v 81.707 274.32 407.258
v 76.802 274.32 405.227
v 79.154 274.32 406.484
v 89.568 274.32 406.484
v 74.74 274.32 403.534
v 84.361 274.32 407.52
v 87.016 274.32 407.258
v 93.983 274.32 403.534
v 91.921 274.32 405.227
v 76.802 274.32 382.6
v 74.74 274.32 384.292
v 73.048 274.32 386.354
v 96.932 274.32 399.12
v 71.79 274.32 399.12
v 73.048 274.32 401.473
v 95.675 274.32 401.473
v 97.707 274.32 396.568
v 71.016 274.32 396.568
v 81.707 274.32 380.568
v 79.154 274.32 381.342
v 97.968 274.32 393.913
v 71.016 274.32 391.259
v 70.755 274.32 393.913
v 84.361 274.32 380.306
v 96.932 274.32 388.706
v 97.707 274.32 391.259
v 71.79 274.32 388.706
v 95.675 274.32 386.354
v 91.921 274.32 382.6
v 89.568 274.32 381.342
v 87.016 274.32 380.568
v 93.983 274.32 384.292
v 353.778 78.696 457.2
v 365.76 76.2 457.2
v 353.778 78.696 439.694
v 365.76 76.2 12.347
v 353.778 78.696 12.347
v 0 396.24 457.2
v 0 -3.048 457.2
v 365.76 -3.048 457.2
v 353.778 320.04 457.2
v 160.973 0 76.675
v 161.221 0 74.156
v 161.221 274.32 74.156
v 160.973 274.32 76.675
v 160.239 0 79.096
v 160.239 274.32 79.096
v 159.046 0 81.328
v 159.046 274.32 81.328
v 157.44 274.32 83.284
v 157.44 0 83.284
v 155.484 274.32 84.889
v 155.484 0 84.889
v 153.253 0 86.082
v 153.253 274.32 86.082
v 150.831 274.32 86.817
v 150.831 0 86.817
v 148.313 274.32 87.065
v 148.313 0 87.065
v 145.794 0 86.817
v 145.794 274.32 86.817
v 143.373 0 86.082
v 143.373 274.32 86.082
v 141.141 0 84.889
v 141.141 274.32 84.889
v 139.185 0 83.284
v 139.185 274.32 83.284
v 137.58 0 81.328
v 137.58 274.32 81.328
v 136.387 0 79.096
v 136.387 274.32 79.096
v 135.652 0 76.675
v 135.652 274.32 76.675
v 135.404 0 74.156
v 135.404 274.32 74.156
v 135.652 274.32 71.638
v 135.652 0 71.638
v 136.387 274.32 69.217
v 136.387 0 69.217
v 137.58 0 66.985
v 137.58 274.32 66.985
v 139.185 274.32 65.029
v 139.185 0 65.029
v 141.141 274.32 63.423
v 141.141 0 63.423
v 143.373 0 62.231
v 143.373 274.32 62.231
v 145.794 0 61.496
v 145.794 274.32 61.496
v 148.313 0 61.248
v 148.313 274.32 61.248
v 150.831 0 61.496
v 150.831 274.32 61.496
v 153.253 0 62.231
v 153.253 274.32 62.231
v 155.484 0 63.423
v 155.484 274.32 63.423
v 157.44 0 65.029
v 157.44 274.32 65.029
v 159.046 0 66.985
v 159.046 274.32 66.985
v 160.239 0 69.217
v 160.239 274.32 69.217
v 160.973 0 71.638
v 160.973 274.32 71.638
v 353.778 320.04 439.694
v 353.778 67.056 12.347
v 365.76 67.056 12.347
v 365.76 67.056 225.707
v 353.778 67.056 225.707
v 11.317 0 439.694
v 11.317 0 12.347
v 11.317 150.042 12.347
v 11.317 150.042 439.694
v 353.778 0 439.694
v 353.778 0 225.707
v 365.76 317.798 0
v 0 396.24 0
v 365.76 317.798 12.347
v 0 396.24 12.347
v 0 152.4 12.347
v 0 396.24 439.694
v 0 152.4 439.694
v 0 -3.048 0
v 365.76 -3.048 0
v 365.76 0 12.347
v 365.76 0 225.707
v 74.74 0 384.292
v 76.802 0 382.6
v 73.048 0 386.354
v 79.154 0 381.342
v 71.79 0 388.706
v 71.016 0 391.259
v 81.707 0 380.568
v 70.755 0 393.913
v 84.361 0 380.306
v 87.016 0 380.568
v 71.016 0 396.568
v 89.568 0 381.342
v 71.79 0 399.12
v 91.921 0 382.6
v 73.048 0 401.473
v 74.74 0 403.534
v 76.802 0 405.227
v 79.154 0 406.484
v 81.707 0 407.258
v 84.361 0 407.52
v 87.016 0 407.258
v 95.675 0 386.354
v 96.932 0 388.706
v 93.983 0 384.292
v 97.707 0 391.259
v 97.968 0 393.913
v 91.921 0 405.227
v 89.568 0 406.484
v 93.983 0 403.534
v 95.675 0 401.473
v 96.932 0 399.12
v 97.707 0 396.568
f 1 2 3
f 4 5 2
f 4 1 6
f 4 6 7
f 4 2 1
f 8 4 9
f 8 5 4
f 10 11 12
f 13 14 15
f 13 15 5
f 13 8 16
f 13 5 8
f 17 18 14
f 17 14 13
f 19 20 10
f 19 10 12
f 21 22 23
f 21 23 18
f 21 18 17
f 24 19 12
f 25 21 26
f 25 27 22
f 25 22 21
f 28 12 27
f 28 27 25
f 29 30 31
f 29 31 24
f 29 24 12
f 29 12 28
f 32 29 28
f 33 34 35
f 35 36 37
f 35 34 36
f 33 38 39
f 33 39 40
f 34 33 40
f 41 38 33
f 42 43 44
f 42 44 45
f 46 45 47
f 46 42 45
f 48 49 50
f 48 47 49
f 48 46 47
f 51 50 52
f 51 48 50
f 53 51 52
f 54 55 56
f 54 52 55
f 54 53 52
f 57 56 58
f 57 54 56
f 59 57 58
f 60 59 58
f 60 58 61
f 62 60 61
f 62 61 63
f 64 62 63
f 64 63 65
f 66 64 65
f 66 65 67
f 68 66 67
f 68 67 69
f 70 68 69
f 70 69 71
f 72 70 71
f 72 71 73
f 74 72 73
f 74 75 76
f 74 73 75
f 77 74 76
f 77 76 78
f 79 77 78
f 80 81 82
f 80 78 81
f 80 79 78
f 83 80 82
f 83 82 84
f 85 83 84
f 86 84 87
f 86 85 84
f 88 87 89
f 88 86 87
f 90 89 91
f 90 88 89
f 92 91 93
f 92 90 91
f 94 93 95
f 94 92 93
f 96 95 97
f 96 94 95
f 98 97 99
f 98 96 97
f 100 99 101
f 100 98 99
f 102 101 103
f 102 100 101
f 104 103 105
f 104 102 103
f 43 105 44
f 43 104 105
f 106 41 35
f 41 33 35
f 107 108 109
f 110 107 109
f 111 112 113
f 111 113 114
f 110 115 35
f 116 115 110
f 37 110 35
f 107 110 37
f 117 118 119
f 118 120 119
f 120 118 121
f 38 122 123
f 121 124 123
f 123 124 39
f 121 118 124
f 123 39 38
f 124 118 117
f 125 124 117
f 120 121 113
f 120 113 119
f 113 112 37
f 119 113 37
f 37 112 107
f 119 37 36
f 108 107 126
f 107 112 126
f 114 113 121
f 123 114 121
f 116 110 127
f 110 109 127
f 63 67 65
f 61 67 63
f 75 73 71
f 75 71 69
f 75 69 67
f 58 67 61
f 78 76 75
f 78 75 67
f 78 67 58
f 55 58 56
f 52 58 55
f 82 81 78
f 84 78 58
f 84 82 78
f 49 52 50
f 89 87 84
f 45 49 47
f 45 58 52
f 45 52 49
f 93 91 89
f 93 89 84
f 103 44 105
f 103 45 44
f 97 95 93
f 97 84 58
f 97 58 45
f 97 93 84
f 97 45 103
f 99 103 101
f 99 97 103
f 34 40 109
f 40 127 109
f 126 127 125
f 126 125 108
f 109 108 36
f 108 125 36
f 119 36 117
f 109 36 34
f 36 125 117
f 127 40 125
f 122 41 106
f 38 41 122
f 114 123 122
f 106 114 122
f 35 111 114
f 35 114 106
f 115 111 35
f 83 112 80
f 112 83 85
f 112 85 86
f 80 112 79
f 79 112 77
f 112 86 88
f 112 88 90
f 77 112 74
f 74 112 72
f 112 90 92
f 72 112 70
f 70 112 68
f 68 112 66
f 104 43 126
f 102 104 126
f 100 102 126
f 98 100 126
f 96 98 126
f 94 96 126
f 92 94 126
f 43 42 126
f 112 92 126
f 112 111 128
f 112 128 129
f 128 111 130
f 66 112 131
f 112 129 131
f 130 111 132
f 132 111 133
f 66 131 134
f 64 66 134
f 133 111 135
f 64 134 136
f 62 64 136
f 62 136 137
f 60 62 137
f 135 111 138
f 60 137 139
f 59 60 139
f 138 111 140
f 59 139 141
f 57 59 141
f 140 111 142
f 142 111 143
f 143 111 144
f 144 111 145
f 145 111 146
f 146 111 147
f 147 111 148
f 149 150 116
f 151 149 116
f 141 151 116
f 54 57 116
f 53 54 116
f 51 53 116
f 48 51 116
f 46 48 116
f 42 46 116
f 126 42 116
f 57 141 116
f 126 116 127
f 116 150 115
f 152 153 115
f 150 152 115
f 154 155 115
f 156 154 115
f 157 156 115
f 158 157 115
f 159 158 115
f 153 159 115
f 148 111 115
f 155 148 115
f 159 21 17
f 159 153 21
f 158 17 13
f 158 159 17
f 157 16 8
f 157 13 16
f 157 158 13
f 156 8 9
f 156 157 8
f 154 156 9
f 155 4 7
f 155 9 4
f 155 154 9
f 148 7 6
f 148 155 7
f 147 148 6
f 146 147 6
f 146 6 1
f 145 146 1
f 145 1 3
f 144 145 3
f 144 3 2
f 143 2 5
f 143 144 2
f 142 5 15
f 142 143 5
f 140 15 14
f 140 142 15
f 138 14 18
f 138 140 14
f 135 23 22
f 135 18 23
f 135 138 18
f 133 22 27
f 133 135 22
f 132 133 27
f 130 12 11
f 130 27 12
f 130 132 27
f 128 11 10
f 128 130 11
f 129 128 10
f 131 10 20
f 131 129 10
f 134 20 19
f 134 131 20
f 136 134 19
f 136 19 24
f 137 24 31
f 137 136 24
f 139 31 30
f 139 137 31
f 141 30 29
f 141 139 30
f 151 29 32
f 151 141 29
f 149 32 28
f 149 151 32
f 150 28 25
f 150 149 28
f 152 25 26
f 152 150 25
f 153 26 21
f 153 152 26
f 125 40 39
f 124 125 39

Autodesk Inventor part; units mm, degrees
ref_plane "YZ Plane" through (0, 0, 0) normal (1, 0, 0) x (0, 1, 0)
ref_plane "XZ Plane" through (0, 0, 0) normal (0, 1, 0) x (-1, 0, 0)
ref_plane "XY Plane" through (0, 0, 0) normal (0, 0, 1) x (1, 0, 0)
sketch "Sketch1" plane through (0, 0, 0) normal (0, 0, 1) x (1, 0, 0)
  line L0 (0, 0) -> (0, 152.4)
  line L1 (0, 0) -> (365.76, 0)
  line L2 (365.76, 0) -> (365.76, 76.2)
  line L3 (365.76, 76.2) -> (0, 152.4)
  line L4 (3.048, 0) -> (6.929, 0)
  dimension "d0" = 152.4
  dimension "d1" = 365.76
extrude "Extrusion1" add sketch "Sketch1" along normal blind 457.2
sketch "Sketch2" plane through (0, 0, 0) normal (0, -1, 0) x (1, 0, 0)
  line L0 (11.3168, 439.6936) -> (353.778, 439.6936)
  line L1 (353.778, 439.6936) -> (353.778, 12.302)
  line L2 (353.778, 12.302) -> (11.3168, 12.302)
  line L3 (11.3168, 12.302) -> (11.3168, 439.6936)
  point P0 (0, 0)
extrude "Extrusion2" cut sketch "Sketch2" against normal blind 426.72
sketch "Sketch3" plane through (0, 0, 457.2) normal (0, 0, 1) x (1, 0, 0)
  line L0 (0, 0) -> (365.76, 0) projected
  line L1 (0, 0) -> (365.76, 0)
  line L2 (365.76, 0) -> (365.76, -3.048)
  line L3 (365.76, -3.048) -> (0, -3.048)
  line L4 (0, -3.048) -> (0, 0)
  dimension "d6" = 3.048
extrude "Extrusion3" add sketch "Sketch3" against normal blind 457.2
sketch "Sketch4" plane through (365.76, 76.2, 457.2) normal (1, 0, 0) x (0, 0, -1)
  point P0 (457.2, -76.2)
sketch "Sketch5" plane through (365.76, 76.2, 457.2) normal (1, 0, 0) x (0, 0, -1)
  line L0 (0, -79.248) -> (0, 0) projected
  line L1 (457.2, 0) -> (457.2, -79.248) projected
  line L2 (457.2, 0) -> (457.2, 76.2) projected
  line L3 (457.2, 0) -> (441.96, 0)
  line L4 (457.2, 0) -> (0, 0) projected
  line L5 (17.5064, -76.2) -> (444.898, -76.2) projected
  line L6 (441.96, 0) -> (228.6, 0)
  line L7 (228.6, 0) -> (228.6, -76.2)
  line L8 (228.6, -76.2) -> (441.96, -76.2)
  line L9 (441.96, -76.2) -> (441.96, 0)
  point P0 (457.2, -76.2)
  dimension "d24" = 15.24
  dimension "d25" = 213.36
extrude "Extrusion4" [suppressed]
sketch "Sketch6" plane through (365.76, -3.048, 457.2) normal (1, 0, 0) x (0, 0, -1)
  point P0 (457.2, 3.048)
sketch "Sketch7" plane through (11.3168, 0, 12.302) normal (0, 1, 0) x (1, 0, 0)
  circle A0 centre (73.0445, -381.6111) radius 13.6067
  circle A1 centre (136.9959, -61.8544) radius 12.9084
  point P0 (-11.3168, 12.302)
extrude "Extrusion5" add sketch "Sketch7" along normal blind 274.32
sketch "Sketch8" plane through (0, 0, 457.2) normal (0, 0, 1) x (1, 0, 0)
  point P0 (0, 0)
sketch "Sketch9" plane through (11.3168, 0, 12.302) normal (0, 1, 0) x (1, 0, 0)
  line L0 (354.4432, -444.898) -> (-11.3168, -444.898) projected
  line L1 (-11.3168, -444.898) -> (342.4612, -444.898)
  line L2 (342.4612, -444.898) -> (342.4612, -427.3916)
  line L3 (342.4612, -427.3916) -> (-11.3168, -427.3916)
  line L4 (-11.3168, -427.3916) -> (-11.3168, -444.898)
  point P0 (-11.3168, 12.302)
extrude "Extrusion6" add sketch "Sketch9" along normal blind 396.24
sketch "Sketch10" plane through (0, 0, 457.2) normal (0, 0, 1) x (1, 0, 0)
  line L0 (0, 396.24) -> (0, -3.048) projected
  line L1 (353.778, 396.24) -> (0, 396.24) projected
  line L2 (0, 396.24) -> (353.778, 396.24)
  line L3 (353.778, 78.6962) -> (353.778, 396.24) projected
  line L4 (353.778, 396.24) -> (353.778, 320.04)
  line L5 (353.778, 320.04) -> (0, 396.24)
  point P0 (0, 0)
  dimension "d17" = 76.2
extrude "Extrusion7" cut sketch "Sketch10" against normal blind 3048
sketch "Sketch11" plane through (11.3168, 0, 12.302) normal (0, 1, 0) x (1, 0, 0)
  line L0 (-11.3168, -444.898) -> (-11.3168, 12.302) projected
  line L1 (354.4432, -444.898) -> (354.4432, 12.302) projected
  line L2 (-11.3168, -0.0453) -> (354.4432, -0.0453)
  line L3 (354.4432, -0.0453) -> (354.4432, 12.302)
  line L4 (354.4432, 12.302) -> (-11.3168, 12.302)
  line L5 (-11.3168, 12.302) -> (-11.3168, -0.0453)
  point P0 (354.4432, -109.618)
extrude "Extrusion8" add sketch "Sketch11" along normal blind 396.24
sketch "Sketch12" plane through (11.3168, 0, 12.3473) normal (0, 0, 1) x (1, 0, 0)
  line L0 (354.4432, 396.24) -> (-11.3168, 396.24) projected
  line L1 (-11.3168, 396.24) -> (354.4432, 317.798)
  line L2 (354.4432, 396.24) -> (354.4432, -3.048) projected
  line L3 (-11.3168, 396.24) -> (342.4612, 320.04) projected
  line L4 (354.4432, 396.24) -> (-11.3168, 396.24)
  point P0 (-11.3168, 0)
extrude "Extrusion9" cut sketch "Sketch12" against normal blind 3048
sketch "Sketch13" plane through (353.778, 0, 439.6936) normal (0, 0, -1) x (-1, 0, 0)
  point P0 (353.778, 0)
sketch "Sketch14" plane through (353.778, 0, 439.6936) normal (0, 0, -1) x (-1, 0, 0)
  point P0 (353.778, 0)
sketch "Sketch15" plane through (365.76, -3.048, 457.2) normal (1, 0, 0) x (0, 0, -1)
  line L0 (444.8527, 79.248) -> (0, 79.248) projected
  line L1 (444.8527, 81.7442) -> (444.8527, 3.048) projected
  line L2 (17.5064, 3.048) -> (444.8527, 3.048) projected
  line L3 (444.8527, 70.104) -> (231.4927, 70.104)
  line L4 (231.4927, 70.104) -> (231.4927, 3.048)
  line L5 (231.4927, 3.048) -> (444.8527, 3.048)
  line L6 (444.8527, 3.048) -> (444.8527, 70.104)
  point P0 (457.2, 3.048)
  dimension "d26" = 9.144
  dimension "d27" = 213.36
extrude "Extrusion10" cut sketch "Sketch15" against normal blind 25.4
properties part number "new base part"
